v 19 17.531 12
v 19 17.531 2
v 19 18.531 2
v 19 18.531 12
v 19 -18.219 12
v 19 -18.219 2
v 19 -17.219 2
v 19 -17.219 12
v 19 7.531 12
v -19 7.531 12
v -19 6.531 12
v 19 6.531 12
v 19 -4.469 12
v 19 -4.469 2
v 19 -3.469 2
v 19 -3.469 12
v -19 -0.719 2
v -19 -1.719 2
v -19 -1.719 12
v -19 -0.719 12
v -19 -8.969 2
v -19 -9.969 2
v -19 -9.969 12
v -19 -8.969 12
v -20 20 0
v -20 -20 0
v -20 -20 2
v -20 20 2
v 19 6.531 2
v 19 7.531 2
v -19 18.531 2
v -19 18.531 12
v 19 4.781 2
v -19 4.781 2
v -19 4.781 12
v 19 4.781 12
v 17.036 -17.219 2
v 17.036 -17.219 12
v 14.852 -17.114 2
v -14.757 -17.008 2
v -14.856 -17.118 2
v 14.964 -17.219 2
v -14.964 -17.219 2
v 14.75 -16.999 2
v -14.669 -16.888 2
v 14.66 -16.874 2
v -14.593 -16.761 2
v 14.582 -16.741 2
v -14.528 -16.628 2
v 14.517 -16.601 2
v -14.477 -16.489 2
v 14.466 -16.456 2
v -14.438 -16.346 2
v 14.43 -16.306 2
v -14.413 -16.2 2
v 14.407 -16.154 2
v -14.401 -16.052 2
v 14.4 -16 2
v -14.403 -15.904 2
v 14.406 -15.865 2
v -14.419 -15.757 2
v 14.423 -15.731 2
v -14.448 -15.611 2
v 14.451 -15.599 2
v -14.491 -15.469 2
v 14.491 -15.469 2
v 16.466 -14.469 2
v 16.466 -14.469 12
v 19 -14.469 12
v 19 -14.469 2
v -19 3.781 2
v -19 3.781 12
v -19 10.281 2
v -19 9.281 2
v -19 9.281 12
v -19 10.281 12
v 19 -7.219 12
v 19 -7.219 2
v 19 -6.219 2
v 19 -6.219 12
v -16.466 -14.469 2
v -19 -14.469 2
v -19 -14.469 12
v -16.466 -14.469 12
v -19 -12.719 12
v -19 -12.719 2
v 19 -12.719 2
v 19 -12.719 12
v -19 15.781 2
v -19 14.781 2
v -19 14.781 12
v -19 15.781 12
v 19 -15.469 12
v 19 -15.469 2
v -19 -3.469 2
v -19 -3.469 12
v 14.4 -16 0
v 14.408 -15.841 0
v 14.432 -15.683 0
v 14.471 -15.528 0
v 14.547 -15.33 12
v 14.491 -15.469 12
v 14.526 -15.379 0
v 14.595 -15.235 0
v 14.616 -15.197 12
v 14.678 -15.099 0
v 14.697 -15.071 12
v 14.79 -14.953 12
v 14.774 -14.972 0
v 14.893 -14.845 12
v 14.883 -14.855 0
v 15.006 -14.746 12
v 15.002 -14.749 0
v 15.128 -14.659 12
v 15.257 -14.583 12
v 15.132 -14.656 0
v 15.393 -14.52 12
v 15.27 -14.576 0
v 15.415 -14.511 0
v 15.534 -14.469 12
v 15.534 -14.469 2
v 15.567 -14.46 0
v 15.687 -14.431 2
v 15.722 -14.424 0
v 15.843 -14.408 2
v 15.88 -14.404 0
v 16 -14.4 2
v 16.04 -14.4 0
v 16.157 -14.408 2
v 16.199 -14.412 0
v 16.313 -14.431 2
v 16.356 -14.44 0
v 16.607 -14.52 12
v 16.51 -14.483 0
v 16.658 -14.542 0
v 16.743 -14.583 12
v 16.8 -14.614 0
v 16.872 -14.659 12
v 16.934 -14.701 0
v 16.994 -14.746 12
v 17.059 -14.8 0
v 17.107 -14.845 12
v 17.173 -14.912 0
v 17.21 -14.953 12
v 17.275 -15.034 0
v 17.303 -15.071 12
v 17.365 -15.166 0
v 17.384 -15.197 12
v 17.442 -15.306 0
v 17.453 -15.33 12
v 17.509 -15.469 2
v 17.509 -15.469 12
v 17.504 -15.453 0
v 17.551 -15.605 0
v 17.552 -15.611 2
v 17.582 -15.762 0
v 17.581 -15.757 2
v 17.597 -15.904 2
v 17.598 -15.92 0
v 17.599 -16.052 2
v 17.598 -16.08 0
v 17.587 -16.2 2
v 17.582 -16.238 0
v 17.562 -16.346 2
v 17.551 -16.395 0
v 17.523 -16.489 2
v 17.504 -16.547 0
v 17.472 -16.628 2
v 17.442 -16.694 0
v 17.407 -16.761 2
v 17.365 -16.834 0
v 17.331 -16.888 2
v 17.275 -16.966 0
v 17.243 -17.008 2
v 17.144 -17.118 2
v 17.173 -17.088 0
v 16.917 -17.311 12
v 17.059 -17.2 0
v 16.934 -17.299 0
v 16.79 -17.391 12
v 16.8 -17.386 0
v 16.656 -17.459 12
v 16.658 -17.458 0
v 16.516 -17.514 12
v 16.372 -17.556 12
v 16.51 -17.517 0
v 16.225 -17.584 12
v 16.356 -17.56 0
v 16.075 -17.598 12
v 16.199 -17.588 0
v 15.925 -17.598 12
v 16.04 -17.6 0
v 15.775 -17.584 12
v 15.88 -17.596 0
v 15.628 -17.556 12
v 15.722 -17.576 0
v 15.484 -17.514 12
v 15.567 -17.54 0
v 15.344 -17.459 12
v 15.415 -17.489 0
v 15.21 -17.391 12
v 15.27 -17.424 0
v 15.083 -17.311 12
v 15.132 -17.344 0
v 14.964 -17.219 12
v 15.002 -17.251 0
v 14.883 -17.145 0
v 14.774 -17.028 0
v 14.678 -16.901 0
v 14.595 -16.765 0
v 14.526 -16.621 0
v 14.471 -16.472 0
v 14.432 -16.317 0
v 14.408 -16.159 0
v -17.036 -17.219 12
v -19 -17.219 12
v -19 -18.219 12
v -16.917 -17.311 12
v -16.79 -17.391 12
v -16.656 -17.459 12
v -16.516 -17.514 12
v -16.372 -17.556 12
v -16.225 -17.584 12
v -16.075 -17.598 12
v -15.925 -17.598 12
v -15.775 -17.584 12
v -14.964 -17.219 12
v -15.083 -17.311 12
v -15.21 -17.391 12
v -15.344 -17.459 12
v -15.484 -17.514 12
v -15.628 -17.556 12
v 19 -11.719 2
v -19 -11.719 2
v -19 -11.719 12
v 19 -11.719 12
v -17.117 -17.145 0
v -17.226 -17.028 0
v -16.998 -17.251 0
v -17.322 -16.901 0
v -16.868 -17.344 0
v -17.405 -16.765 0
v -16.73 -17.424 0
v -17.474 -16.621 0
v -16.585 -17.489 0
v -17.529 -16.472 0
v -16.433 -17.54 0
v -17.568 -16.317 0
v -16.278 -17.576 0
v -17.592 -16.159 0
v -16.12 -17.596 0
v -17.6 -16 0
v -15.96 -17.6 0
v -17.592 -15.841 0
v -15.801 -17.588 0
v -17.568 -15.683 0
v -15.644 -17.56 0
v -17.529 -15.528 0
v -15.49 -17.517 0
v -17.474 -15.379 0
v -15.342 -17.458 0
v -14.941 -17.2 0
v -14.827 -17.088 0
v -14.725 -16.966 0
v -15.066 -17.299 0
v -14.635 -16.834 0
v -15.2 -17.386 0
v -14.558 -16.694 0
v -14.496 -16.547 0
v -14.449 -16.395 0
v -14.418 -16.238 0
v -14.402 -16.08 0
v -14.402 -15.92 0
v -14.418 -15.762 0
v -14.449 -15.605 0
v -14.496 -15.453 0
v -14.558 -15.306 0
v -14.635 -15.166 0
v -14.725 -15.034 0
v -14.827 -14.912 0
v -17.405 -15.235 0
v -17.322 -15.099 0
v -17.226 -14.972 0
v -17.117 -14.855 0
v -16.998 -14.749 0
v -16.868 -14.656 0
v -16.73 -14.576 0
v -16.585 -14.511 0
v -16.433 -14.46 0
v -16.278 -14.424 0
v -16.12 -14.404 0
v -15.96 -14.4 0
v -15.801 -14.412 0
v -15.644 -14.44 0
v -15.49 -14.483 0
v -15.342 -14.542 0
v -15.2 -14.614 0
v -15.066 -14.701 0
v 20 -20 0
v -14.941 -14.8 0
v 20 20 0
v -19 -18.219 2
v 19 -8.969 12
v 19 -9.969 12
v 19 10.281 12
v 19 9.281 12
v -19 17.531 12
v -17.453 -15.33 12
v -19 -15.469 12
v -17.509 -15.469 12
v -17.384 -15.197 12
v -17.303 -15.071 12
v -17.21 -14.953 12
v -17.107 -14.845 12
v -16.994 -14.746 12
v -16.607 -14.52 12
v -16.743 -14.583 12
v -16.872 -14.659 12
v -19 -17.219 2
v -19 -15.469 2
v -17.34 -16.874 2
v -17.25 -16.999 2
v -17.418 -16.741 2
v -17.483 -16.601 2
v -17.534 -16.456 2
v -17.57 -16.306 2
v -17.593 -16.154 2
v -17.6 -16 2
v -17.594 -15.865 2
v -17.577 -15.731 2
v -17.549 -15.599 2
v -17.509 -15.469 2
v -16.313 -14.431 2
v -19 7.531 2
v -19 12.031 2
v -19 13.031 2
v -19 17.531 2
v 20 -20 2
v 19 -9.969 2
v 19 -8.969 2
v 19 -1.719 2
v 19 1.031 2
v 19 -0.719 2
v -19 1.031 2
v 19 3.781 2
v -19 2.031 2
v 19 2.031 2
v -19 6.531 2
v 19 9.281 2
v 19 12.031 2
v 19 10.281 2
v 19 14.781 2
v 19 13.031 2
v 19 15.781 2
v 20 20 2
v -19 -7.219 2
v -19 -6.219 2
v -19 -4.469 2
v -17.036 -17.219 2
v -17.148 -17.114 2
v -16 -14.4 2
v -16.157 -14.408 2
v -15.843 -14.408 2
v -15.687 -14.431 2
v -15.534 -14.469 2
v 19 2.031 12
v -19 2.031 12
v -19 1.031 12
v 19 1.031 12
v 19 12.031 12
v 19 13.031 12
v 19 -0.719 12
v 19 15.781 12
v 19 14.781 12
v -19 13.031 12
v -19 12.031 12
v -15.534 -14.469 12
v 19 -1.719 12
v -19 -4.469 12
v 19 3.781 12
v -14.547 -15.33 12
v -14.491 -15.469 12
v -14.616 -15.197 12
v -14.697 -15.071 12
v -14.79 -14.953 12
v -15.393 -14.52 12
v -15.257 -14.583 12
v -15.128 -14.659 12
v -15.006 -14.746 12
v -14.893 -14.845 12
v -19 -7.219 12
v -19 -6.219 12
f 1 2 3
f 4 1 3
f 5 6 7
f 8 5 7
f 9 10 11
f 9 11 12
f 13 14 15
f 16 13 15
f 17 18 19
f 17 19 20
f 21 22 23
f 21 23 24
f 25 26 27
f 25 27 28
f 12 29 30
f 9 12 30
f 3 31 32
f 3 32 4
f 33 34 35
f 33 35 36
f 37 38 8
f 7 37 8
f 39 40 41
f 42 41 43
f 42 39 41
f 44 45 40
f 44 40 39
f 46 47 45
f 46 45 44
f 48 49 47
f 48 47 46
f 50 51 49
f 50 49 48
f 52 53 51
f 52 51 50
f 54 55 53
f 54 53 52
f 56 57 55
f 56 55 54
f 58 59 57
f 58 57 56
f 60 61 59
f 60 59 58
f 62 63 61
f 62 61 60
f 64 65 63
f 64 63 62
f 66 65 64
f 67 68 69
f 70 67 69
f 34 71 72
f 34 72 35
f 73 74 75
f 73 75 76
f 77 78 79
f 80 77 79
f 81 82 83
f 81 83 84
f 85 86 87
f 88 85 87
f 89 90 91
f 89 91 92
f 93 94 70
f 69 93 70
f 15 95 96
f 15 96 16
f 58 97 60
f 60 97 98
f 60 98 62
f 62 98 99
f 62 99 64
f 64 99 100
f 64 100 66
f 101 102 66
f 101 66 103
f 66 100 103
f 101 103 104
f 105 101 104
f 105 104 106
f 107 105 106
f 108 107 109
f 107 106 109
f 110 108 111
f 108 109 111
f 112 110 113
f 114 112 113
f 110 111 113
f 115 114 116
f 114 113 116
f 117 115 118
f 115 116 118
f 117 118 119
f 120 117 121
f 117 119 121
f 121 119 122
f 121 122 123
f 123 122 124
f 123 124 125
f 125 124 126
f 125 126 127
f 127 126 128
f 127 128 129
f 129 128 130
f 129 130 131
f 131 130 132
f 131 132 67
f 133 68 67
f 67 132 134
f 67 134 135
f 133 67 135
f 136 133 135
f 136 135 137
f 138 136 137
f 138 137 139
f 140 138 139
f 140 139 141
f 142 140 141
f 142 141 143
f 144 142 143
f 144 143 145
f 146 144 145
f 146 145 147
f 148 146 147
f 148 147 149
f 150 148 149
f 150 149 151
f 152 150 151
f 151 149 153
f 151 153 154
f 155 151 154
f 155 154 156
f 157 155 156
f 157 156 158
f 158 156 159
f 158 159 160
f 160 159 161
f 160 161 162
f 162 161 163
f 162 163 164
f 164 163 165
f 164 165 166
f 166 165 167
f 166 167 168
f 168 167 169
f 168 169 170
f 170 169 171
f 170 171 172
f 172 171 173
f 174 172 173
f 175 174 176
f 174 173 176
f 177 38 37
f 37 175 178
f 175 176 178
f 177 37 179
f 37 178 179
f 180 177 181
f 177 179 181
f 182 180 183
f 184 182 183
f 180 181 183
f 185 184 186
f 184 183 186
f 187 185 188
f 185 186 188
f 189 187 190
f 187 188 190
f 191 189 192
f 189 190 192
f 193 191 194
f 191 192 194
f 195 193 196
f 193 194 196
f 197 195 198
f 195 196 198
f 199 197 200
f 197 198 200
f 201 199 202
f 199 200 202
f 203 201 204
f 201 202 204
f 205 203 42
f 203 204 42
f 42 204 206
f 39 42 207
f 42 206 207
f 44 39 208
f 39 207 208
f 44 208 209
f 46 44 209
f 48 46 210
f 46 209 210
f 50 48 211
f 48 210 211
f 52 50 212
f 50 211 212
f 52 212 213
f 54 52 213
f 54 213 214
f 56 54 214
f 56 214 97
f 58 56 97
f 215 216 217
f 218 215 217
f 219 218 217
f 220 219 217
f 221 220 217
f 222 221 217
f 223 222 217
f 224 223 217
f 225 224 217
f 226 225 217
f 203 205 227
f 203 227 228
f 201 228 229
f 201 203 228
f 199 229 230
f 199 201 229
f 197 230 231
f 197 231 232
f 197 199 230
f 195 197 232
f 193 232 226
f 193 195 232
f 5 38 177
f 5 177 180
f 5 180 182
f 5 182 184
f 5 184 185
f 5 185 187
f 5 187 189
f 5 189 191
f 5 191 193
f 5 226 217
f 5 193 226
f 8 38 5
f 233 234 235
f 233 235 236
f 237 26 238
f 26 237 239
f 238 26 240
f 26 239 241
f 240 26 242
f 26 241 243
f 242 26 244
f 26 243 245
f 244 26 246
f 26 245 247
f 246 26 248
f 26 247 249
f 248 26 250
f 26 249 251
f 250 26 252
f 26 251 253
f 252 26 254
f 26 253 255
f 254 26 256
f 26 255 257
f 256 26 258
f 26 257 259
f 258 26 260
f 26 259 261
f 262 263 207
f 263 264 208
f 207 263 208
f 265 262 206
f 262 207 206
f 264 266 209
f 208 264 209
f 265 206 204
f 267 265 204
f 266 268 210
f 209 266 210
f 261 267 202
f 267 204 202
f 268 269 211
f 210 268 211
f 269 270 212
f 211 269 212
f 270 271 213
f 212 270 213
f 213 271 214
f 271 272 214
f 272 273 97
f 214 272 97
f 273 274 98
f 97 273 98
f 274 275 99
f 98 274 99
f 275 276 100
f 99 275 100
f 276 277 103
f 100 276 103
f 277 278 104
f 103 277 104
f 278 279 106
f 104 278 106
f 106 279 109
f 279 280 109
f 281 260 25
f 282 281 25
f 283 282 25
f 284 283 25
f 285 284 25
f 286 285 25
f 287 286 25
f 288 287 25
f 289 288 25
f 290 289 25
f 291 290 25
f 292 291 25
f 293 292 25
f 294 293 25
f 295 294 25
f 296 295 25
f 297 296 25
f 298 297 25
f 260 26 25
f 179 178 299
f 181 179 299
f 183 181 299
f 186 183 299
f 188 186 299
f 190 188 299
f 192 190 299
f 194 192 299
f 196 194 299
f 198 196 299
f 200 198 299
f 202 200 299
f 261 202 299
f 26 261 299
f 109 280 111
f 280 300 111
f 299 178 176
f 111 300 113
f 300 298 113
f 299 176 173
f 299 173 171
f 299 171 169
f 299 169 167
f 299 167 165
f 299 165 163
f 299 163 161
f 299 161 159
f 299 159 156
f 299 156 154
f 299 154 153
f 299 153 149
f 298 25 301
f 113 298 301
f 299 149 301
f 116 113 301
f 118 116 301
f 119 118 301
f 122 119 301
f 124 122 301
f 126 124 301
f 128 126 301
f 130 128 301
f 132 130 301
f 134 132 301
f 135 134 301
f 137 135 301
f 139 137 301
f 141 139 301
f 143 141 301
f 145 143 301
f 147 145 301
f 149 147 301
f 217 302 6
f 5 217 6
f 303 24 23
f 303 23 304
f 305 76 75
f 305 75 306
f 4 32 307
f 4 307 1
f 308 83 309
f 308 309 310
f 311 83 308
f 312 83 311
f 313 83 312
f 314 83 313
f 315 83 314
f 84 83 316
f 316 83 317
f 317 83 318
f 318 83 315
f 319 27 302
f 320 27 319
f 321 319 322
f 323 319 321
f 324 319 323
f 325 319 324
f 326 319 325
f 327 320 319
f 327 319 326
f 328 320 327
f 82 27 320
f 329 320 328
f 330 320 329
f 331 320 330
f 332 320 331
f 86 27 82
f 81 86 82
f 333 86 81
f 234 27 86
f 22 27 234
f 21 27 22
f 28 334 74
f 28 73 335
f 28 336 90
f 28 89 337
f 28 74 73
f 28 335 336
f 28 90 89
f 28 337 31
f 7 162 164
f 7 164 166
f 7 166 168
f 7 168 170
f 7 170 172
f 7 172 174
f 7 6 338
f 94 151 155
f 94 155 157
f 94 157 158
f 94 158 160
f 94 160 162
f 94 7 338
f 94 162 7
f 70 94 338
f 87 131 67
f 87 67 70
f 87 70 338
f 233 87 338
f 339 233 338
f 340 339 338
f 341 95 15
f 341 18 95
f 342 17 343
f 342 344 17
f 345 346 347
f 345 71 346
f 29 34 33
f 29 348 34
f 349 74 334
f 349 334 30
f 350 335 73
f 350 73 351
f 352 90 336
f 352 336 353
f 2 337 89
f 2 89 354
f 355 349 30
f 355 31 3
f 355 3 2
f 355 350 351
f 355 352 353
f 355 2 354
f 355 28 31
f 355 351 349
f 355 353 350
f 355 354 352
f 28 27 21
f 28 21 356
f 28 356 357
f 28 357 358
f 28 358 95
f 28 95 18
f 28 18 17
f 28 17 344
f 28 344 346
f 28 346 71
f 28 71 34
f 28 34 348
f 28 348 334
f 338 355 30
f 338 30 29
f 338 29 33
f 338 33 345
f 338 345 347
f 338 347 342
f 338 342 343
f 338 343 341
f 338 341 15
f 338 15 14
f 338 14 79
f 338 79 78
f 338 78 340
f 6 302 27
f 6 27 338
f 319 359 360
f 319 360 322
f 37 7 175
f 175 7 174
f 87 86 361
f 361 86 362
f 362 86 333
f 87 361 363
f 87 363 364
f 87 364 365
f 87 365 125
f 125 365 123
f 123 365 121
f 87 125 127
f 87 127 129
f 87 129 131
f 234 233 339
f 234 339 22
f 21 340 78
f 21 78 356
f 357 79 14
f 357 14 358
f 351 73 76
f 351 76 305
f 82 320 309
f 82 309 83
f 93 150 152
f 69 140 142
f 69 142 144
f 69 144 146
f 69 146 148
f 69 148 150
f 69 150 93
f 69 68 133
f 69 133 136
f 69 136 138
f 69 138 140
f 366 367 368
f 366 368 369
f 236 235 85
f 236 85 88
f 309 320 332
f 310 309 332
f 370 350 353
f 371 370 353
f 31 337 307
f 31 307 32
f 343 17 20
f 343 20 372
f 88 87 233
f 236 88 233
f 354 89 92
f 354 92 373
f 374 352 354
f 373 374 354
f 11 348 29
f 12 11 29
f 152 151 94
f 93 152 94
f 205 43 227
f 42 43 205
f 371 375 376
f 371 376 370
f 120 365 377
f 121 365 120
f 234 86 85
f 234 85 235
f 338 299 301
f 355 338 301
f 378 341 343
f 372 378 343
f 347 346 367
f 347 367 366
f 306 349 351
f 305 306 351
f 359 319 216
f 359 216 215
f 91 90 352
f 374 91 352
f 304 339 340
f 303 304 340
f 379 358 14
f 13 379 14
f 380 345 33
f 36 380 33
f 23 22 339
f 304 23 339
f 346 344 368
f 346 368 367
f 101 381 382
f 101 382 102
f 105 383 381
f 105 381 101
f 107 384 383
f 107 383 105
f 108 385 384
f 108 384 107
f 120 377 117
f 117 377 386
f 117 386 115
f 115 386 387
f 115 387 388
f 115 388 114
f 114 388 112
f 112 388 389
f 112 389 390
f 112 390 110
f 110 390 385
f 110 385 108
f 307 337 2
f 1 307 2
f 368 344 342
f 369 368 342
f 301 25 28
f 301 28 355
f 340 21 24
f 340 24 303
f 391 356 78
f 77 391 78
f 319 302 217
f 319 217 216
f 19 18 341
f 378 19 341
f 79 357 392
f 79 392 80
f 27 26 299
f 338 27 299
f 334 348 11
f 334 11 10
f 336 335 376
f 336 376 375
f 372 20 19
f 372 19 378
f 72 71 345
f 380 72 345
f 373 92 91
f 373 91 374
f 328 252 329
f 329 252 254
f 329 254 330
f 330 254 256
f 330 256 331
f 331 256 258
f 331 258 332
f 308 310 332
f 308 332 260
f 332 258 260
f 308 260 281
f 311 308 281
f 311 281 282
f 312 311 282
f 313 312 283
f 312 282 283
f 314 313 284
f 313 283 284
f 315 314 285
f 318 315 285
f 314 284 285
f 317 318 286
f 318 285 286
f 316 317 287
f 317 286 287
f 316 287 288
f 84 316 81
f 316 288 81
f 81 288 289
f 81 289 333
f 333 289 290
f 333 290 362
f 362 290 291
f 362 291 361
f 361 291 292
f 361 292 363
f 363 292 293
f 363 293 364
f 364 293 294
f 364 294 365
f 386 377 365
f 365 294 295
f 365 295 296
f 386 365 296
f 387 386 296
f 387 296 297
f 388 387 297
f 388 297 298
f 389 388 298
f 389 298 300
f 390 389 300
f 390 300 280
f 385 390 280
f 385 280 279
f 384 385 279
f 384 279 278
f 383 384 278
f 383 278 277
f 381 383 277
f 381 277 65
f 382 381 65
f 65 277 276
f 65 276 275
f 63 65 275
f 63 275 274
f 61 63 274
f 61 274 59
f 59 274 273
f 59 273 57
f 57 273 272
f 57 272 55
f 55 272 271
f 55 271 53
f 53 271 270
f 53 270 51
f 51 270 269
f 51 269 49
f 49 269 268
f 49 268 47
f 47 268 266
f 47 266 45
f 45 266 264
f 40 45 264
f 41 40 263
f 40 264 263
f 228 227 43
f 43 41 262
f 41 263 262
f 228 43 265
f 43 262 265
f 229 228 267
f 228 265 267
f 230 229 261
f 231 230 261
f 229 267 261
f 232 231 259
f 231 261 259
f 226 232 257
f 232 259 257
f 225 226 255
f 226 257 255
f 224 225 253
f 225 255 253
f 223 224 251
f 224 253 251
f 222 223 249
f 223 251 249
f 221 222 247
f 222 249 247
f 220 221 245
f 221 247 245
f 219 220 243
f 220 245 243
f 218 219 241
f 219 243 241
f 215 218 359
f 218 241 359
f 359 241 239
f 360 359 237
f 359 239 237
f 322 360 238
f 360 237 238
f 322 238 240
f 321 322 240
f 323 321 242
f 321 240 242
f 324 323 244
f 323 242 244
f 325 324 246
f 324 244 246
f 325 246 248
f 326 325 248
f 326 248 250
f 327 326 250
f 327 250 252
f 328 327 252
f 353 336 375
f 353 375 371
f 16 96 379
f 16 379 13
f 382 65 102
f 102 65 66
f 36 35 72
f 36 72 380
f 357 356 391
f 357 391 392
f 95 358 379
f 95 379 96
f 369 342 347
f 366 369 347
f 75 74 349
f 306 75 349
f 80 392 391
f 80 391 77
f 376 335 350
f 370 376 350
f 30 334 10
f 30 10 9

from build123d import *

# Parameters (mm, degrees)
SKETCH1_W           = 40
SKETCH1_H           = 40
BOSS_EXTRUDE1_DEPTH = 2
SKETCH2_W           = 38
SKETCH2_H           = 1
BOSS_EXTRUDE2_DEPTH = 10
SKETCH3_R           = 1.6
CUT_EXTRUDE1_DEPTH  = 13


with BuildPart() as part:
    # Sketch1 → Boss-Extrude1 (new body)
    with BuildSketch(Plane.XY):
        Rectangle(SKETCH1_W, SKETCH1_H)
    extrude(amount=BOSS_EXTRUDE1_DEPTH)

    # Sketch2 → Boss-Extrude2 (add)
    with BuildSketch(Plane.XY.offset(2)):
        with Locations((0, 15.280666702)):
            Rectangle(SKETCH2_W, SKETCH2_H)
        with Locations((0, 18.030666702)):
            Rectangle(SKETCH2_W, SKETCH2_H)
        with Locations((0, 12.530666702)):
            Rectangle(SKETCH2_W, SKETCH2_H)
        with Locations((0, 9.780666702)):
            Rectangle(SKETCH2_W, SKETCH2_H)
        with Locations((0, 7.030666702)):
            Rectangle(SKETCH2_W, SKETCH2_H)
        with Locations((0, 4.280666702)):
            Rectangle(SKETCH2_W, SKETCH2_H)
        with Locations((0, 1.530666702)):
            Rectangle(SKETCH2_W, SKETCH2_H)
        with Locations((0, -1.219333298)):
            Rectangle(SKETCH2_W, SKETCH2_H)
        with Locations((0, -3.969333298)):
            Rectangle(SKETCH2_W, SKETCH2_H)
        with Locations((0, -6.719333298)):
            Rectangle(SKETCH2_W, SKETCH2_H)
        with Locations((0, -9.469333298)):
            Rectangle(SKETCH2_W, SKETCH2_H)
        with Locations((0, -12.219333298)):
            Rectangle(SKETCH2_W, SKETCH2_H)
        with Locations((0, -14.969333298)):
            Rectangle(SKETCH2_W, SKETCH2_H)
        with Locations((0, -17.719333298)):
            Rectangle(SKETCH2_W, SKETCH2_H)
    extrude(amount=BOSS_EXTRUDE2_DEPTH)

    # Sketch3 → Cut-Extrude1 (cut, through all)
    with BuildSketch(Plane(origin=(0, 0, 0), x_dir=(-1, 0, 0), z_dir=(0, 0, -1))):
        with Locations((16, -16)):
            Circle(SKETCH3_R)
        with Locations((-16, -16)):
            Circle(SKETCH3_R)
    extrude(amount=-CUT_EXTRUDE1_DEPTH, mode=Mode.SUBTRACT)


solid = part.part
